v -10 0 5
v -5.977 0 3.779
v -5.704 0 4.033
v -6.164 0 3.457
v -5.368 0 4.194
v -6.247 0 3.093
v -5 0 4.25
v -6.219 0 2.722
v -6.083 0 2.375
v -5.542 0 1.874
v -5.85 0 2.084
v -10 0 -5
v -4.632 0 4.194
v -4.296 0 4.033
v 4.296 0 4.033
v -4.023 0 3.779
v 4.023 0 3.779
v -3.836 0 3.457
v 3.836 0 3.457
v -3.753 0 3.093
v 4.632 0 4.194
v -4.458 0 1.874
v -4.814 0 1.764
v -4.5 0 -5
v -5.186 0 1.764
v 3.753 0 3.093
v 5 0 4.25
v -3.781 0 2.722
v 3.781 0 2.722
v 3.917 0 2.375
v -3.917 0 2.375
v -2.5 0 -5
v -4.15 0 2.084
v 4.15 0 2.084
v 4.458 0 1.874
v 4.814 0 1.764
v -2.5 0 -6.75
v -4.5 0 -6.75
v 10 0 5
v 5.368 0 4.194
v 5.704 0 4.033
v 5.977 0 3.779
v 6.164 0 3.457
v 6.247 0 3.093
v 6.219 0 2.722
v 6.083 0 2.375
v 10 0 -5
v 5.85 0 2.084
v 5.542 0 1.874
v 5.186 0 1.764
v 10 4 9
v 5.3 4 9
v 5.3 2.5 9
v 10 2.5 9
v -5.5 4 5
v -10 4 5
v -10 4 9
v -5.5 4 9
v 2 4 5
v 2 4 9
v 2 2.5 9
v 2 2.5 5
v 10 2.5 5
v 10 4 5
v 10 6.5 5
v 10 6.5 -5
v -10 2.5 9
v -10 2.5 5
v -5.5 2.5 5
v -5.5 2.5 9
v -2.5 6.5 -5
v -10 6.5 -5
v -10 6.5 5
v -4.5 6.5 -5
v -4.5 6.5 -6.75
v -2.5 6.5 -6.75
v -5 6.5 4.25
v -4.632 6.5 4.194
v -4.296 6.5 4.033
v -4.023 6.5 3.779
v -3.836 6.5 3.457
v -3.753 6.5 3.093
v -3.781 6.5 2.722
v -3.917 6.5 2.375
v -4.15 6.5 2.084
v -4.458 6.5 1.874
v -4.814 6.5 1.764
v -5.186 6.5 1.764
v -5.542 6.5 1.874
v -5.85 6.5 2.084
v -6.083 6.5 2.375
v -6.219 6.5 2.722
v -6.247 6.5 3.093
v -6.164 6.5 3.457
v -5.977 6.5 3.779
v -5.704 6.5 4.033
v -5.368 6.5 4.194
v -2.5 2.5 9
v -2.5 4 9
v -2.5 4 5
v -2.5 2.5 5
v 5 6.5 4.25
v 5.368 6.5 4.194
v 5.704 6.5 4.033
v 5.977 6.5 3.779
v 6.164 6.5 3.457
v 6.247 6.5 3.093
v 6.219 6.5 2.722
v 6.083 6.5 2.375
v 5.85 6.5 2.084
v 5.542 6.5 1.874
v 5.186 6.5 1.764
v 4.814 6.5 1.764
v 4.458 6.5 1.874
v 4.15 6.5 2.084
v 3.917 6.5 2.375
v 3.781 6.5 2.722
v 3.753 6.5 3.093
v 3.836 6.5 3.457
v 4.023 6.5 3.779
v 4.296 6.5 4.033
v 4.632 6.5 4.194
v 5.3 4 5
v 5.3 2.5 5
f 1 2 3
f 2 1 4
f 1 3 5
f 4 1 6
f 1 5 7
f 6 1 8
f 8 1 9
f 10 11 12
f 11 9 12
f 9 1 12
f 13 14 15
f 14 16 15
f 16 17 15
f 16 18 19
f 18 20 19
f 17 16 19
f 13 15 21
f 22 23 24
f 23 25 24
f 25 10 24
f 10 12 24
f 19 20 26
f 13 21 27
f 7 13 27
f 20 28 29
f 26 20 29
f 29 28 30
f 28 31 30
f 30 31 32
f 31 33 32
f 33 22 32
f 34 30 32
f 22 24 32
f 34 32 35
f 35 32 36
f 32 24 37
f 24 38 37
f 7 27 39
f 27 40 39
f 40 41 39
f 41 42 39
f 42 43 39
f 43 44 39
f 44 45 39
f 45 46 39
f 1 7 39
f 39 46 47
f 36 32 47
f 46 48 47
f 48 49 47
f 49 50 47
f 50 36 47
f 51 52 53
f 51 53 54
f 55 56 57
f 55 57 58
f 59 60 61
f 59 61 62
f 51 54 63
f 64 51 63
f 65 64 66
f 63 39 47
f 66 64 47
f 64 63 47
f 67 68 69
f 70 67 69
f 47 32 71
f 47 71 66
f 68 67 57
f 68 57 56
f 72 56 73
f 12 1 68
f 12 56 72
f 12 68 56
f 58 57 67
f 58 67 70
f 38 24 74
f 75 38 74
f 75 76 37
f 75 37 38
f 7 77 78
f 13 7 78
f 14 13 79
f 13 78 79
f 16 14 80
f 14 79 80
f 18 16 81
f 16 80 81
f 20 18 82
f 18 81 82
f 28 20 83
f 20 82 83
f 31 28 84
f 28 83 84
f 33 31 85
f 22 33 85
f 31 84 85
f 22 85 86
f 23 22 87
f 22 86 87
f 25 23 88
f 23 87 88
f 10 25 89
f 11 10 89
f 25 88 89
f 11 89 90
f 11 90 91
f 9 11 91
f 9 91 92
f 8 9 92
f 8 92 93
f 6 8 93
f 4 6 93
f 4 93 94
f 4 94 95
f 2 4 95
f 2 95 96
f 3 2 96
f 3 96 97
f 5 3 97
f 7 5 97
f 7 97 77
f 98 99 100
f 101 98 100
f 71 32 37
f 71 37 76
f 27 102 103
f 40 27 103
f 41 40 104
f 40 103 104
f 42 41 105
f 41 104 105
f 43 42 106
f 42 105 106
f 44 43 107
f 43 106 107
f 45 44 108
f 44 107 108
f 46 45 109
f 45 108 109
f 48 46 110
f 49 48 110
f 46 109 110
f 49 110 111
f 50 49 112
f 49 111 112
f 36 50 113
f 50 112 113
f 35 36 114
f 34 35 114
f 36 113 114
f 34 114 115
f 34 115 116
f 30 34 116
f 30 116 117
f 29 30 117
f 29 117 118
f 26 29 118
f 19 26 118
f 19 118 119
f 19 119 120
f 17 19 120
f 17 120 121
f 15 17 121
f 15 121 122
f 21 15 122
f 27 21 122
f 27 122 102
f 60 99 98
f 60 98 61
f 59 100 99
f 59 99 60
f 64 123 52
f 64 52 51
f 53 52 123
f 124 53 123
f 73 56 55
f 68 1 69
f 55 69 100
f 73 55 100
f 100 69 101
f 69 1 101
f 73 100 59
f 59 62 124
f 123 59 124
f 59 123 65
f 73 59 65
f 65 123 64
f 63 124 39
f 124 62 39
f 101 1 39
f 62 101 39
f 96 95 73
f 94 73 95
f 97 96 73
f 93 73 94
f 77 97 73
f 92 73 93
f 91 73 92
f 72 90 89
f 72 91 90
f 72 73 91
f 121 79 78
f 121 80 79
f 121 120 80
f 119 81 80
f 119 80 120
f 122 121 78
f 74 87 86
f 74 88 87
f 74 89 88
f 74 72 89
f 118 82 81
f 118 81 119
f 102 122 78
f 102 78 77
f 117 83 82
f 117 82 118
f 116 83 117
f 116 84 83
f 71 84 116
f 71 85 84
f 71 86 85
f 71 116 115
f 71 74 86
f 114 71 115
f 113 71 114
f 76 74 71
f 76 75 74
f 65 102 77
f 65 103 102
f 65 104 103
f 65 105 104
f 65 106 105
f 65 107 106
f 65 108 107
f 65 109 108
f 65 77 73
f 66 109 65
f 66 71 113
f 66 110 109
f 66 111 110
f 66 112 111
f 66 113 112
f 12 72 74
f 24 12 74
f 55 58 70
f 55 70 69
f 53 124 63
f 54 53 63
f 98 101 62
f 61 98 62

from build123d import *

# Parameters (mm, degrees)
SKETCH1_W           = 20
SKETCH1_H           = 10
BOSS_EXTRUDE1_DEPTH = 6.5
SKETCH2_W           = 20
SKETCH2_H           = 1.5
BOSS_EXTRUDE2_DEPTH = 4
SKETCH3_R           = 1.25
CUT_EXTRUDE1_DEPTH  = 15.941552797
SKETCH4_W           = 2
SKETCH4_H           = 6.5
BOSS_EXTRUDE3_DEPTH = 1.75
SKETCH5_W           = 3
SKETCH5_H           = 4
SKETCH5_W_2         = 3.3
CUT_EXTRUDE2_DEPTH  = 1.75


with BuildPart() as part:
    # Sketch1 → Boss-Extrude1 (new body)
    with BuildSketch(Plane(origin=(0, 0, 0), x_dir=(1, 0, 0), z_dir=(0, 1, 0))):
        Rectangle(SKETCH1_W, SKETCH1_H)
    extrude(amount=BOSS_EXTRUDE1_DEPTH)

    # Sketch2 → Boss-Extrude2 (add)
    with BuildSketch(Plane.XY.offset(5)):
        with Locations((0, 3.25)):
            Rectangle(SKETCH2_W, SKETCH2_H)
    extrude(amount=BOSS_EXTRUDE2_DEPTH)

    # Sketch3 → Cut-Extrude1 (cut, through all)
    with BuildSketch(Plane(origin=(0, 6.5, 0), x_dir=(1, 0, 0), z_dir=(0, 1, 0))):
        with Locations(Location((-5, -3, 0), (0, 0, 270))):
            Circle(SKETCH3_R)
        with Locations(Location((5, -3, 0), (0, 0, 270))):
            Circle(SKETCH3_R)
    extrude(amount=-CUT_EXTRUDE1_DEPTH, mode=Mode.SUBTRACT)

    # Sketch4 → Boss-Extrude3 (add)
    with BuildSketch(Plane(origin=(0, 0, -5), x_dir=(-1, 0, 0), z_dir=(0, 0, -1))):
        with Locations((3.5, 3.25)):
            Rectangle(SKETCH4_W, SKETCH4_H)
    extrude(amount=BOSS_EXTRUDE3_DEPTH)

    # Sketch5 → Cut-Extrude2 (cut)
    with BuildSketch(Plane(origin=(0, 4, 0), x_dir=(1, 0, 0), z_dir=(0, 1, 0))):
        with Locations((-4, -7)):
            Rectangle(SKETCH5_W, SKETCH5_H)
        with Locations((3.65, -7)):
            Rectangle(SKETCH5_W_2, SKETCH5_H)
    extrude(amount=-CUT_EXTRUDE2_DEPTH, mode=Mode.SUBTRACT)


solid = part.part
